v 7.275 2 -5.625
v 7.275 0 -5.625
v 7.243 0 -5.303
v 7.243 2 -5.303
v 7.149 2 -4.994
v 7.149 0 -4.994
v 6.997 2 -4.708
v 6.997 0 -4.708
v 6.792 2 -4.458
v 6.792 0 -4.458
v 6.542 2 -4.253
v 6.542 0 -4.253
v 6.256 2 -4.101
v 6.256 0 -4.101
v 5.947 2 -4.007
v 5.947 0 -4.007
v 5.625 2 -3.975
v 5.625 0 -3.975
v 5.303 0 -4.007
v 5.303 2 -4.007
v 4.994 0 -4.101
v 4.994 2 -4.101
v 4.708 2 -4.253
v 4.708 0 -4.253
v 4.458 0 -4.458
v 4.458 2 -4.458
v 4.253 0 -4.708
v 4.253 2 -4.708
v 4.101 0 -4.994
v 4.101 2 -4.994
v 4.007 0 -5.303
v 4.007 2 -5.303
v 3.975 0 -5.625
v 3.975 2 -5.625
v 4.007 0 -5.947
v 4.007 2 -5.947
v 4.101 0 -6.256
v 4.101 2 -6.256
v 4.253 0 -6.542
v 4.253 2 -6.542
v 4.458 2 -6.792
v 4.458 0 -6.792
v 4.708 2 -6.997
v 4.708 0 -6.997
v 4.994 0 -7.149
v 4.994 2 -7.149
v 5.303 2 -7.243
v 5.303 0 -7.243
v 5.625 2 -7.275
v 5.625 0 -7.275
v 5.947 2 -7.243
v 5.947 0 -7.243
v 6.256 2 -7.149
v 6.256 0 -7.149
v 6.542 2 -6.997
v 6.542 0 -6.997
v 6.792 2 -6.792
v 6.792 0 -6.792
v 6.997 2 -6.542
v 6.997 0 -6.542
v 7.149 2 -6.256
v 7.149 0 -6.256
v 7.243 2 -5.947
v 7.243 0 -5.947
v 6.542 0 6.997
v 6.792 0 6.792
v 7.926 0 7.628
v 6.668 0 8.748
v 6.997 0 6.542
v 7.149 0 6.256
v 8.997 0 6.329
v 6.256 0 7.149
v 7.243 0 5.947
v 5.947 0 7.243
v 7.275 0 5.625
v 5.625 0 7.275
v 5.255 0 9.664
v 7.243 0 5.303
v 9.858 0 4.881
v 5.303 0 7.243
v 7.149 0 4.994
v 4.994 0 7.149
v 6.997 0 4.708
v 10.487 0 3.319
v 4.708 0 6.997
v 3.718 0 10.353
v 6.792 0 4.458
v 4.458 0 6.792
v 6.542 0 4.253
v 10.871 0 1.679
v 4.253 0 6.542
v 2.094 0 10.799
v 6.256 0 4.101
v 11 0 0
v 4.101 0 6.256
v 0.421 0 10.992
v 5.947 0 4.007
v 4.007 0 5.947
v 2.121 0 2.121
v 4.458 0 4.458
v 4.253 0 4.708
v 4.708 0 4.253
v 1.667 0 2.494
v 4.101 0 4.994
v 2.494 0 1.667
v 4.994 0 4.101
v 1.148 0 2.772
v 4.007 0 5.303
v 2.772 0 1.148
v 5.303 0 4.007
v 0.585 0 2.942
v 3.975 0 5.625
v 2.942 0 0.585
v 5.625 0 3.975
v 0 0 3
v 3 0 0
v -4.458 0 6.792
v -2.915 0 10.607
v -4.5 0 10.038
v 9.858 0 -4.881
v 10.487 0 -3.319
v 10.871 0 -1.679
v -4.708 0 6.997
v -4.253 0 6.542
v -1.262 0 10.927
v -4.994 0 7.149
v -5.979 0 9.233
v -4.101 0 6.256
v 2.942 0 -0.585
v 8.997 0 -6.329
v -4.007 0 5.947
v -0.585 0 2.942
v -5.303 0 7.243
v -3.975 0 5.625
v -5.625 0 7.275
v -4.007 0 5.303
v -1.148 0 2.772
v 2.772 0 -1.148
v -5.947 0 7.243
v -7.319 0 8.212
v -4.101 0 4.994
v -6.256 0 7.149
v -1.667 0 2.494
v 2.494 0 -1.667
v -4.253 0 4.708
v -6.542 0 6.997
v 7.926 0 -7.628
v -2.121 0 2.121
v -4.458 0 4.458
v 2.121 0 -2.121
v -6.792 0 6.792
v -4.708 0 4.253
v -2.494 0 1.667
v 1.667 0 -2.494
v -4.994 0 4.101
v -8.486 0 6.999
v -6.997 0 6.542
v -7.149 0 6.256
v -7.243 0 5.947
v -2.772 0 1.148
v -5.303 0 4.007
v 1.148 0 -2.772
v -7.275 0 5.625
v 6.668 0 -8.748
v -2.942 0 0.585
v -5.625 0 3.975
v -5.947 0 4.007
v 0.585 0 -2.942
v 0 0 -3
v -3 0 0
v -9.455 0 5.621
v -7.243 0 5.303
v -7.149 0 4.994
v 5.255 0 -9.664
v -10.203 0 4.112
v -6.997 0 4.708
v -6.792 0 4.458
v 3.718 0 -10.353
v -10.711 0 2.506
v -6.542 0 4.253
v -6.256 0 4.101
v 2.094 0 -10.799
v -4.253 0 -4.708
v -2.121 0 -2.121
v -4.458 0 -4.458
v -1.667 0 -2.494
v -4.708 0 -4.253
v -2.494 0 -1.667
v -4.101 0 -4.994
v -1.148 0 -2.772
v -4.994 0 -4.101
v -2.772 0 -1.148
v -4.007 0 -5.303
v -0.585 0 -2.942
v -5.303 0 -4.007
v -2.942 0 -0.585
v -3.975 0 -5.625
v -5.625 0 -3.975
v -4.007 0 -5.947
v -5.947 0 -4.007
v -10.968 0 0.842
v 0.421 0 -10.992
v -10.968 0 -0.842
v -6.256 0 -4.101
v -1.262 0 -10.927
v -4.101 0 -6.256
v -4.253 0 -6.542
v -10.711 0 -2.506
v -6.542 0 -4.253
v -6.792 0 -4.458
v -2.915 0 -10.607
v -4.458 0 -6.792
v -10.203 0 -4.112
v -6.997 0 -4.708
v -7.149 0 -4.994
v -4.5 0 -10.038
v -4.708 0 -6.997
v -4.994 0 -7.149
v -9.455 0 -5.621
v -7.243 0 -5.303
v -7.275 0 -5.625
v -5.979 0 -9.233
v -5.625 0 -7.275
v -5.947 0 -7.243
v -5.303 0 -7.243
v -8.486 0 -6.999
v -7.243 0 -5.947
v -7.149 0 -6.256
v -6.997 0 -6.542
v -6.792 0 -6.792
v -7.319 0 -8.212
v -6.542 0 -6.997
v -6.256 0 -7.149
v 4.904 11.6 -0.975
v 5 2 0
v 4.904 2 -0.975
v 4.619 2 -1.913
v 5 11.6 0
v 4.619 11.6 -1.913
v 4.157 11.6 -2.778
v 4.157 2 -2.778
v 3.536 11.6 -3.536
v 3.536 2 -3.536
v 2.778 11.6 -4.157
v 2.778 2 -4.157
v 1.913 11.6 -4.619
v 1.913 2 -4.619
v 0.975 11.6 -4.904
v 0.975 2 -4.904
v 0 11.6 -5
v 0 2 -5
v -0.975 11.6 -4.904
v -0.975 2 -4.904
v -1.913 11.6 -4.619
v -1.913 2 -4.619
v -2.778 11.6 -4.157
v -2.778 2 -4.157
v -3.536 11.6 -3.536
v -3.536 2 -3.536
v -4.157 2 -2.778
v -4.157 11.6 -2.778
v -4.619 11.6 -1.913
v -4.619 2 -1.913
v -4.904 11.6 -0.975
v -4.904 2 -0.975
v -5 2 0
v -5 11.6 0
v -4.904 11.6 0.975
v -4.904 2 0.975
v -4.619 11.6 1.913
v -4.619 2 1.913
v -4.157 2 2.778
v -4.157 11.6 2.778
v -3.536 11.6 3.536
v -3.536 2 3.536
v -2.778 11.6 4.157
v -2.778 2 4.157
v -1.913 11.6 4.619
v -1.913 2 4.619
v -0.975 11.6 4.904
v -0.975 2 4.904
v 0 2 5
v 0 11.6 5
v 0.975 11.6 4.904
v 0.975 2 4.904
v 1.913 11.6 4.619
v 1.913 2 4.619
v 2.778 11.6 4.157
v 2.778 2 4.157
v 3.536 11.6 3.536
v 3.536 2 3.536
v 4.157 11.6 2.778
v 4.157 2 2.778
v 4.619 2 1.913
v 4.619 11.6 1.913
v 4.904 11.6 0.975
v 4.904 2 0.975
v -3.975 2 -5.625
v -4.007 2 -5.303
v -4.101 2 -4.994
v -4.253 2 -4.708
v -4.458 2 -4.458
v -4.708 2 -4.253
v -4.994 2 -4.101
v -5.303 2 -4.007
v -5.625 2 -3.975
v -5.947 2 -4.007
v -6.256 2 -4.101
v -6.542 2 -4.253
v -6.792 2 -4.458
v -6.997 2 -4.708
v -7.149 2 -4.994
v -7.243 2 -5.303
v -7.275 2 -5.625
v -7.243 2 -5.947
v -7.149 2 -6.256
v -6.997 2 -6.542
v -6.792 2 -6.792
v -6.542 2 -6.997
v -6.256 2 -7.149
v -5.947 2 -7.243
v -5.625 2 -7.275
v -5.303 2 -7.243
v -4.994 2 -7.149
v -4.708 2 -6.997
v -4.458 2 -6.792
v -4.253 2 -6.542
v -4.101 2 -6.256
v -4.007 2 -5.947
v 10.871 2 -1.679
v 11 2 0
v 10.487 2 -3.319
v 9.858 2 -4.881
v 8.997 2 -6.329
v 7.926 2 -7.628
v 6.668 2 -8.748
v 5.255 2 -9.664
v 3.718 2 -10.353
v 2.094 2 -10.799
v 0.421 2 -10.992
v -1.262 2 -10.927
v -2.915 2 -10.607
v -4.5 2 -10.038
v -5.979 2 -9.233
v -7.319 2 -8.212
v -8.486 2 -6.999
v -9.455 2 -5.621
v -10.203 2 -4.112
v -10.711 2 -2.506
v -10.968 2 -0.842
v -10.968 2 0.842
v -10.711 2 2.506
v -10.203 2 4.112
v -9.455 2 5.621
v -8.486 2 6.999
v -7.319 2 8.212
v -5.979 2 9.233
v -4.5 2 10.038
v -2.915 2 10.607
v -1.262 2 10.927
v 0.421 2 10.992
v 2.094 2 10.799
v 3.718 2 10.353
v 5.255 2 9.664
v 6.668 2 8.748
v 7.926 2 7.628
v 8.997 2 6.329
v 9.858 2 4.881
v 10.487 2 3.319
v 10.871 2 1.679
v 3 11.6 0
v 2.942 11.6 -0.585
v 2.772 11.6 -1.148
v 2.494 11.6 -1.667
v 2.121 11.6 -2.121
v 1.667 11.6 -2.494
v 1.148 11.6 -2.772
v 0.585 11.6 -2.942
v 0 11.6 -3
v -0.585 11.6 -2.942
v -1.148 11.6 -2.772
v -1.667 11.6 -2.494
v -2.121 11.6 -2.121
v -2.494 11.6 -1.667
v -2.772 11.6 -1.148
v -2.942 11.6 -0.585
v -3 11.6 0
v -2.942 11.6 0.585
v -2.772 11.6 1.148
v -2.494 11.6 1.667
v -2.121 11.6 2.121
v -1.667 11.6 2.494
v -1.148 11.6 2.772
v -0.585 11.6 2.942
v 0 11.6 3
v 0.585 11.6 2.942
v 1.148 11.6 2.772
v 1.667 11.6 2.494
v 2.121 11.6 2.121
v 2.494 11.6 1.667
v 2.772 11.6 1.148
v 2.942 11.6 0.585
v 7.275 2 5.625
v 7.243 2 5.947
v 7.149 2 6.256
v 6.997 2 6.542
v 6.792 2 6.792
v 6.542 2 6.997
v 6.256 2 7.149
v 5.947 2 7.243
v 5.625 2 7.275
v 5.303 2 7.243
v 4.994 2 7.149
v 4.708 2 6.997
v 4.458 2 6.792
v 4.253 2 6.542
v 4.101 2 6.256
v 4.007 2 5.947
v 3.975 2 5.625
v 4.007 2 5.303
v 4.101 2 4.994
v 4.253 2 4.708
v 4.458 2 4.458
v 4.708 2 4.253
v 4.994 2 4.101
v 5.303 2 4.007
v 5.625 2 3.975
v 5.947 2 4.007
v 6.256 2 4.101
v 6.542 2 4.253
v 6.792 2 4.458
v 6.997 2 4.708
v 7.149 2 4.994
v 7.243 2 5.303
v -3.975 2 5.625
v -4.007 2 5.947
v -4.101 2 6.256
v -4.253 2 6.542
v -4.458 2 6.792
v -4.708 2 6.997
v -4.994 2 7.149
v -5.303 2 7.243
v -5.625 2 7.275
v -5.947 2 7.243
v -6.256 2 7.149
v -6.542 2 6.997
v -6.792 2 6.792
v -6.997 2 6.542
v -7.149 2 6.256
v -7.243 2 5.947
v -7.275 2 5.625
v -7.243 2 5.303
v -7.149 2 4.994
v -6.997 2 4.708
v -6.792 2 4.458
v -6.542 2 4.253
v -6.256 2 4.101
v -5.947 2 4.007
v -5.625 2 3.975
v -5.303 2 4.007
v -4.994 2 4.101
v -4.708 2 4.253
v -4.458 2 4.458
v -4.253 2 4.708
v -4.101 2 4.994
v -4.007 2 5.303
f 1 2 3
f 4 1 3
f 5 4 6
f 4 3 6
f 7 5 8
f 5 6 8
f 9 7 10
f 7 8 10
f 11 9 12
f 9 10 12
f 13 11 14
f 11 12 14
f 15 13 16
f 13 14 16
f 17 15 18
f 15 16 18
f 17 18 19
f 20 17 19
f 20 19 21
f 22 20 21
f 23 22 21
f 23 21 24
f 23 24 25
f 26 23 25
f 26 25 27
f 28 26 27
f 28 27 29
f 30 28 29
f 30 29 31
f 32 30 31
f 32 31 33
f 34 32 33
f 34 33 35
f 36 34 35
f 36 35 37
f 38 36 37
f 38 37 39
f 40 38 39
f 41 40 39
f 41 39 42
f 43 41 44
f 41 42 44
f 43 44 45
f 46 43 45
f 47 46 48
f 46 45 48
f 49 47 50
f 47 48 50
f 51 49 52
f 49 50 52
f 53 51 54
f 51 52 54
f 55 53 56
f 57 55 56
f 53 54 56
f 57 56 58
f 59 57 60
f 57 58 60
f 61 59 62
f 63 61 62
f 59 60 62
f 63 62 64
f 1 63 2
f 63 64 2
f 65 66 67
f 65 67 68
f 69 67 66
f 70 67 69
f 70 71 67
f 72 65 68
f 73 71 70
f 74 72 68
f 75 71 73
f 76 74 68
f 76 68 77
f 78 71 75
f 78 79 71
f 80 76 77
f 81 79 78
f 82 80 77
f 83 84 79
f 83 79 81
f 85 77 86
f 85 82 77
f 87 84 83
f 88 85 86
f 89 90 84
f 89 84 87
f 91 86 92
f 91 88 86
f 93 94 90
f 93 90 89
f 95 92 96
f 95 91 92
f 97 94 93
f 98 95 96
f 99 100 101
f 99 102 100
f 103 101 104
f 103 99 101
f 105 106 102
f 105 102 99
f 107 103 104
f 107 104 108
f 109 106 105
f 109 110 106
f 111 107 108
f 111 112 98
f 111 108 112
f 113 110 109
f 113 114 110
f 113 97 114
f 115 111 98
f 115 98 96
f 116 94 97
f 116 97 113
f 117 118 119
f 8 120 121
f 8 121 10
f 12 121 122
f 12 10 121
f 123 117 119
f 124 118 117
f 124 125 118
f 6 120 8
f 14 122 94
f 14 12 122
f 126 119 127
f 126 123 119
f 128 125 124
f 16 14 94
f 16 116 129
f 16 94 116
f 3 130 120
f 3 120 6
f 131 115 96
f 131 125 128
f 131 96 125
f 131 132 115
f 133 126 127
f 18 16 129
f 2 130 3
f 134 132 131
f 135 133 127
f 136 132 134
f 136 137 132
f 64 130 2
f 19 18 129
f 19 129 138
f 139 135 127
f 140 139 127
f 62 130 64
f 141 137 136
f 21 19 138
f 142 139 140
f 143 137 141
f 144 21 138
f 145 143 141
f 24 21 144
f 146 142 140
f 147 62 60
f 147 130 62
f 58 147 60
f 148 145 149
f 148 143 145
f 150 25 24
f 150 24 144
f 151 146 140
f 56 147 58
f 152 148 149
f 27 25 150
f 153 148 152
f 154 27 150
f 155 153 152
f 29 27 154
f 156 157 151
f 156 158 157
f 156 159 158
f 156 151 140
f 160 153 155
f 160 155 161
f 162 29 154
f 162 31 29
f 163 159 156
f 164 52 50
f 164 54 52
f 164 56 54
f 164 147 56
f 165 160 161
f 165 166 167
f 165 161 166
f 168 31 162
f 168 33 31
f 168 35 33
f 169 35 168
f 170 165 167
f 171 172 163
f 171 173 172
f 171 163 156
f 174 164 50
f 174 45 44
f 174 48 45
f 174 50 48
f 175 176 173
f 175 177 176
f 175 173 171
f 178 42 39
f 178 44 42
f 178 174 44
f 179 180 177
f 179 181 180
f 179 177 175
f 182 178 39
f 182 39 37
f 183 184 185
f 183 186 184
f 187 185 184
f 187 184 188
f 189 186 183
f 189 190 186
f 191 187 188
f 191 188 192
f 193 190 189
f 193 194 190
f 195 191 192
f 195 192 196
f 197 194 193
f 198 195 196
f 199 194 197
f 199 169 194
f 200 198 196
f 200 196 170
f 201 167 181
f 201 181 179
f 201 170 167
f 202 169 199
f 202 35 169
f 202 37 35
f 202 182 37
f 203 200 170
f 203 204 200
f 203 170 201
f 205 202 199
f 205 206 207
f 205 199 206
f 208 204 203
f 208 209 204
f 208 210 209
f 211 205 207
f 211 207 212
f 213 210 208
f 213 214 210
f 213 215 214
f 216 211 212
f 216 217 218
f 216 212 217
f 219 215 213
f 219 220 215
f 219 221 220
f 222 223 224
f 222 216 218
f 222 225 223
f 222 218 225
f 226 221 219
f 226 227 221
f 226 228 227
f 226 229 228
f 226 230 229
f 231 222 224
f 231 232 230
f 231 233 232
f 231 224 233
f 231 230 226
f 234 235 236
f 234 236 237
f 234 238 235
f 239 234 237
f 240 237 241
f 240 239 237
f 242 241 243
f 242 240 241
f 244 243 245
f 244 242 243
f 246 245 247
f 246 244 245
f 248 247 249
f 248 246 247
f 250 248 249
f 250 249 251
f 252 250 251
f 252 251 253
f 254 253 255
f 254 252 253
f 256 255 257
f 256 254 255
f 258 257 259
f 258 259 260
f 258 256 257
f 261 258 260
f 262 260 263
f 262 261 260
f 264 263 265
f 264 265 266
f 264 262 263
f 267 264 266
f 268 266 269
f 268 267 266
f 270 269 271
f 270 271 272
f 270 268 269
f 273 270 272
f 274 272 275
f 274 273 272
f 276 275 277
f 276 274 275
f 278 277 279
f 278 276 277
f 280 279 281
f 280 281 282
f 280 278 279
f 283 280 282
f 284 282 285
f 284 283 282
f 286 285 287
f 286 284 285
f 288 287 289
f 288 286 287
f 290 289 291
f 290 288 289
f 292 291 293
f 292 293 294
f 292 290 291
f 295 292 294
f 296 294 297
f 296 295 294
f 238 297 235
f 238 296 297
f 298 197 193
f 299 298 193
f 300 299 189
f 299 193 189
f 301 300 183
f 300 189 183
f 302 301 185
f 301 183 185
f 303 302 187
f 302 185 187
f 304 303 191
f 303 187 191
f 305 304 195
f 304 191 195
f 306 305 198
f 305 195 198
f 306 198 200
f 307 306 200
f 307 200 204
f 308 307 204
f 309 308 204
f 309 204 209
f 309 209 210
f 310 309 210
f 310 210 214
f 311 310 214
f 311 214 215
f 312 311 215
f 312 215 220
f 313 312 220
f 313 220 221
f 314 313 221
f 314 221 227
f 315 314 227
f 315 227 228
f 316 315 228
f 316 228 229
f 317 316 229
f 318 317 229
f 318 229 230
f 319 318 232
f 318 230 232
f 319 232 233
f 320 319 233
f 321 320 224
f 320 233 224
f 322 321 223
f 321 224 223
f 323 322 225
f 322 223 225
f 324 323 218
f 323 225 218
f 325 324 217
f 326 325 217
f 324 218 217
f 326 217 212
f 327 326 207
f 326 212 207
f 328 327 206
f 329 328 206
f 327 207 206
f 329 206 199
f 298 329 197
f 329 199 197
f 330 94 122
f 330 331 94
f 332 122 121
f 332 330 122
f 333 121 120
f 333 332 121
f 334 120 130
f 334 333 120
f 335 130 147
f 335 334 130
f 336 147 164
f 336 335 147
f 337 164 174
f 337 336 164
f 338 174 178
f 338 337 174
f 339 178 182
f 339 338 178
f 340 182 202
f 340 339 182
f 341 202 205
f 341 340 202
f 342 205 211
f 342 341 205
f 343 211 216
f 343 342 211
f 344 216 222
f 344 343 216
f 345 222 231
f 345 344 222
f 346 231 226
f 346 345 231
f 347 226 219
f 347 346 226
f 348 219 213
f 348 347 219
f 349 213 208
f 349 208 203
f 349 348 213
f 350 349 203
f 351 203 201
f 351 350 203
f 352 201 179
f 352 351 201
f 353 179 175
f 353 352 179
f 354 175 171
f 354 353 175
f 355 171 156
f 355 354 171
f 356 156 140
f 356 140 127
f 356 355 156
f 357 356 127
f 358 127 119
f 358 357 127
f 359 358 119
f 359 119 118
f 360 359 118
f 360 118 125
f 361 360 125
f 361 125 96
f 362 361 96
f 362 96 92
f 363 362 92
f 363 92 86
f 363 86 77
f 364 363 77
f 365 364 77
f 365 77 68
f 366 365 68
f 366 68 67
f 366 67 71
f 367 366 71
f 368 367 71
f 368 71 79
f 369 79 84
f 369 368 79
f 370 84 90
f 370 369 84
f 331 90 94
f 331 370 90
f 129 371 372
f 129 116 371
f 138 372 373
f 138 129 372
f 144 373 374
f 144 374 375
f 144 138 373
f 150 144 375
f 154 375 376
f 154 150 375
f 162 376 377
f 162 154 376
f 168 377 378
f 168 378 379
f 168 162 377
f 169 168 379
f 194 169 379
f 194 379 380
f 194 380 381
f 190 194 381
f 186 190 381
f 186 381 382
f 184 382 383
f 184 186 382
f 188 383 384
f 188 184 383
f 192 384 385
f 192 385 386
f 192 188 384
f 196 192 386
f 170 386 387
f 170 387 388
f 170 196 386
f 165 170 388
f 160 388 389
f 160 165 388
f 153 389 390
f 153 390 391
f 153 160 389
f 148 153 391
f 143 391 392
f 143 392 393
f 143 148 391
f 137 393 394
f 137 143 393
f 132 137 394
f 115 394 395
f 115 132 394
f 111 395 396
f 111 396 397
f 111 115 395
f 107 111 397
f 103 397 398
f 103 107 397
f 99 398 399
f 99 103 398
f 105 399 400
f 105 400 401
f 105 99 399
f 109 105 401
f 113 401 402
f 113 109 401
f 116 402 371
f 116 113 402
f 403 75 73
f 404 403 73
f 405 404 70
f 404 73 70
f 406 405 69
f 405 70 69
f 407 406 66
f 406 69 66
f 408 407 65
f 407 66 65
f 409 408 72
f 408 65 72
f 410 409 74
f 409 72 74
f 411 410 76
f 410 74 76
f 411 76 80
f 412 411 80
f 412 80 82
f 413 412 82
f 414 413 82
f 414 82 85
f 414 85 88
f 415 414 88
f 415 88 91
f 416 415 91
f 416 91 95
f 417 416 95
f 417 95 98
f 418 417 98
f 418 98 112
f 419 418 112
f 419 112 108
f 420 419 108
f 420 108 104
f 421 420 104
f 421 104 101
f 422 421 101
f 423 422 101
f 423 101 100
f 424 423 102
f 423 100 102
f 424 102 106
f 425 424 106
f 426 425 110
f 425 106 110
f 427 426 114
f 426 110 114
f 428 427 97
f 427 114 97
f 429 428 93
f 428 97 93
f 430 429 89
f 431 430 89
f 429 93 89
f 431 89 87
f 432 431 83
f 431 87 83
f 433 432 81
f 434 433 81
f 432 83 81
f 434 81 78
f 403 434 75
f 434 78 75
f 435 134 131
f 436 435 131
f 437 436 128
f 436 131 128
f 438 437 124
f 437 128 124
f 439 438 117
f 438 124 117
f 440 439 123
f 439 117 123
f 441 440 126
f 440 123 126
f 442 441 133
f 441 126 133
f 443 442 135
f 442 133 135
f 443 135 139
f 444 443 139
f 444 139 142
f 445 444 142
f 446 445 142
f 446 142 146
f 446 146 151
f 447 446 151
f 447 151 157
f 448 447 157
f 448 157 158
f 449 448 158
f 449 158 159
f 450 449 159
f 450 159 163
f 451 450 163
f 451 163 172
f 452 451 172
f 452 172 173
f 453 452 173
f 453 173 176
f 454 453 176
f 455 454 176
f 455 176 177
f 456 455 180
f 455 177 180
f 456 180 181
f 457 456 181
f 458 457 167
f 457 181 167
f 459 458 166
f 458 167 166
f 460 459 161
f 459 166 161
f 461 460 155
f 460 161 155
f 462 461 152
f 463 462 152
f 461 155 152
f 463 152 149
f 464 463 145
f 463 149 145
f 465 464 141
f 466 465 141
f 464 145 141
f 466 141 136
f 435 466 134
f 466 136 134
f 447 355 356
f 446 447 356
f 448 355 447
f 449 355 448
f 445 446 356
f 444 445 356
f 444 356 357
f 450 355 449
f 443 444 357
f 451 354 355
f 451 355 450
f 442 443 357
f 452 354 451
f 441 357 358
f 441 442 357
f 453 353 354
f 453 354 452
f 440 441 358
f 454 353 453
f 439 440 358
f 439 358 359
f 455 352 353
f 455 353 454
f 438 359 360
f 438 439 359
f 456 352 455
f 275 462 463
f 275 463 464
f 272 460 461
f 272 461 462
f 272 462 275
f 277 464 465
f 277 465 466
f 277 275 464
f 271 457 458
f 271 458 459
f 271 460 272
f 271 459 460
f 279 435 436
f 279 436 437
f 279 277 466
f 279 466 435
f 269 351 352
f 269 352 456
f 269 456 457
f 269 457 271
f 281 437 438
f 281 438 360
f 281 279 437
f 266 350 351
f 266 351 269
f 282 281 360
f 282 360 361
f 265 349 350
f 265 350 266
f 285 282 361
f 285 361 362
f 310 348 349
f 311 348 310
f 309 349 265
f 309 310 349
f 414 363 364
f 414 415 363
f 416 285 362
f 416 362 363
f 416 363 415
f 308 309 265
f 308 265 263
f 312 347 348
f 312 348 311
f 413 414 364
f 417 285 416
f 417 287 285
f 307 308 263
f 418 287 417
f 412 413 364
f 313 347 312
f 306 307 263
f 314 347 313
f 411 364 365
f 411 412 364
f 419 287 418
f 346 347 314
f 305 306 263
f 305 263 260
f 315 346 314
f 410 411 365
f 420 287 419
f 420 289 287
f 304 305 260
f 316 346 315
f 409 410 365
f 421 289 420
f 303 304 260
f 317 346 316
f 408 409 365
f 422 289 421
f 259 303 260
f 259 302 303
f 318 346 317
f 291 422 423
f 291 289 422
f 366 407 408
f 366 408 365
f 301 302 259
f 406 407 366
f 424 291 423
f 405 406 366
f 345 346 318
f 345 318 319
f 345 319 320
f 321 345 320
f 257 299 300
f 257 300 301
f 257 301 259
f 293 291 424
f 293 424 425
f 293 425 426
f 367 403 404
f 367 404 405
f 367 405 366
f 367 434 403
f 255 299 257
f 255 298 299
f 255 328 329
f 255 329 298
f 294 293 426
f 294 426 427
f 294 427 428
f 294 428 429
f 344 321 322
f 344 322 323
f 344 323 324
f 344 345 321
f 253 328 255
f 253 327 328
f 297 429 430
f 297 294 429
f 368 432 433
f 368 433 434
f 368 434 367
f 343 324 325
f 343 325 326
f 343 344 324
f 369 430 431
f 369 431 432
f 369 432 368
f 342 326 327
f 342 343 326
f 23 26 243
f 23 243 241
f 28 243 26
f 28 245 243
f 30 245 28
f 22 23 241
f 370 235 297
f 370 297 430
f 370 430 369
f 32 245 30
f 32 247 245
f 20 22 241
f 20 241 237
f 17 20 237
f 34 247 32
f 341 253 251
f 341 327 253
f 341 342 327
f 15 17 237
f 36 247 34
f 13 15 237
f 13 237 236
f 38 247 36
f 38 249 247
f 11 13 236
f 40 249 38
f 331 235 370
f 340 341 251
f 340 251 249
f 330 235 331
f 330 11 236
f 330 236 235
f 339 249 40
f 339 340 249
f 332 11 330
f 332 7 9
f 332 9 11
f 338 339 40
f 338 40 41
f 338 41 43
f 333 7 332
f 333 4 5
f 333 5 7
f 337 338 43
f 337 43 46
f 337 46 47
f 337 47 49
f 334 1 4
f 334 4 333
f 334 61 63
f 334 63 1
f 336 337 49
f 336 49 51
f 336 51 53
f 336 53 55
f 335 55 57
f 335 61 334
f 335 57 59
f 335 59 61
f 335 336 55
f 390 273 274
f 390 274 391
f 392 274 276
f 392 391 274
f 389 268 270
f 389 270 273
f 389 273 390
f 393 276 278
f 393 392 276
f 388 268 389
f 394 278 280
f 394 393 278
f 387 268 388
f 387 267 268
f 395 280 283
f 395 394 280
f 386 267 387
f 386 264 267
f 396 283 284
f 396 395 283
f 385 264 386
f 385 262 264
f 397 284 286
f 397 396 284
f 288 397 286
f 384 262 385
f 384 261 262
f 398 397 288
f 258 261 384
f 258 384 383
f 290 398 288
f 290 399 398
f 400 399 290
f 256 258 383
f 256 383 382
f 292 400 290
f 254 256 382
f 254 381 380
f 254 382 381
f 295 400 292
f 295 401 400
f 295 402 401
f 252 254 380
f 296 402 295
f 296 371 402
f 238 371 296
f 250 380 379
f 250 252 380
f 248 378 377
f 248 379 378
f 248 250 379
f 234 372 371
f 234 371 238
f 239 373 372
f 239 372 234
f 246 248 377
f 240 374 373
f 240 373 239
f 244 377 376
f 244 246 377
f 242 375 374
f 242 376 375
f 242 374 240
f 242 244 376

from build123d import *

# Parameters (mm, degrees)
SKETCH_3_R          = 1.65
CUT_EXTRUDE_1_DEPTH = 12.6


with BuildPart() as part:
    # 草图2 → 旋转1 (revolve)
    with BuildSketch(Plane.XY):
        Polygon((3, 11.6), (3, 0), (11, 0), (11, 2), (5, 2), (5, 11.6), align=None)
    revolve(axis=Axis((0, 0, 0), (0, 1, 0)))

    # 草图3 → 切除-拉伸1 (cut, through all)
    with BuildSketch(Plane.XZ):
        with Locations((-5.625, 5.625)):
            Circle(SKETCH_3_R)
        with Locations((5.625, 5.625)):
            Circle(SKETCH_3_R)
        with Locations((5.625, -5.625)):
            Circle(SKETCH_3_R)
        with Locations((-5.625, -5.625)):
            Circle(SKETCH_3_R)
    extrude(amount=-CUT_EXTRUDE_1_DEPTH, mode=Mode.SUBTRACT)


solid = part.part
